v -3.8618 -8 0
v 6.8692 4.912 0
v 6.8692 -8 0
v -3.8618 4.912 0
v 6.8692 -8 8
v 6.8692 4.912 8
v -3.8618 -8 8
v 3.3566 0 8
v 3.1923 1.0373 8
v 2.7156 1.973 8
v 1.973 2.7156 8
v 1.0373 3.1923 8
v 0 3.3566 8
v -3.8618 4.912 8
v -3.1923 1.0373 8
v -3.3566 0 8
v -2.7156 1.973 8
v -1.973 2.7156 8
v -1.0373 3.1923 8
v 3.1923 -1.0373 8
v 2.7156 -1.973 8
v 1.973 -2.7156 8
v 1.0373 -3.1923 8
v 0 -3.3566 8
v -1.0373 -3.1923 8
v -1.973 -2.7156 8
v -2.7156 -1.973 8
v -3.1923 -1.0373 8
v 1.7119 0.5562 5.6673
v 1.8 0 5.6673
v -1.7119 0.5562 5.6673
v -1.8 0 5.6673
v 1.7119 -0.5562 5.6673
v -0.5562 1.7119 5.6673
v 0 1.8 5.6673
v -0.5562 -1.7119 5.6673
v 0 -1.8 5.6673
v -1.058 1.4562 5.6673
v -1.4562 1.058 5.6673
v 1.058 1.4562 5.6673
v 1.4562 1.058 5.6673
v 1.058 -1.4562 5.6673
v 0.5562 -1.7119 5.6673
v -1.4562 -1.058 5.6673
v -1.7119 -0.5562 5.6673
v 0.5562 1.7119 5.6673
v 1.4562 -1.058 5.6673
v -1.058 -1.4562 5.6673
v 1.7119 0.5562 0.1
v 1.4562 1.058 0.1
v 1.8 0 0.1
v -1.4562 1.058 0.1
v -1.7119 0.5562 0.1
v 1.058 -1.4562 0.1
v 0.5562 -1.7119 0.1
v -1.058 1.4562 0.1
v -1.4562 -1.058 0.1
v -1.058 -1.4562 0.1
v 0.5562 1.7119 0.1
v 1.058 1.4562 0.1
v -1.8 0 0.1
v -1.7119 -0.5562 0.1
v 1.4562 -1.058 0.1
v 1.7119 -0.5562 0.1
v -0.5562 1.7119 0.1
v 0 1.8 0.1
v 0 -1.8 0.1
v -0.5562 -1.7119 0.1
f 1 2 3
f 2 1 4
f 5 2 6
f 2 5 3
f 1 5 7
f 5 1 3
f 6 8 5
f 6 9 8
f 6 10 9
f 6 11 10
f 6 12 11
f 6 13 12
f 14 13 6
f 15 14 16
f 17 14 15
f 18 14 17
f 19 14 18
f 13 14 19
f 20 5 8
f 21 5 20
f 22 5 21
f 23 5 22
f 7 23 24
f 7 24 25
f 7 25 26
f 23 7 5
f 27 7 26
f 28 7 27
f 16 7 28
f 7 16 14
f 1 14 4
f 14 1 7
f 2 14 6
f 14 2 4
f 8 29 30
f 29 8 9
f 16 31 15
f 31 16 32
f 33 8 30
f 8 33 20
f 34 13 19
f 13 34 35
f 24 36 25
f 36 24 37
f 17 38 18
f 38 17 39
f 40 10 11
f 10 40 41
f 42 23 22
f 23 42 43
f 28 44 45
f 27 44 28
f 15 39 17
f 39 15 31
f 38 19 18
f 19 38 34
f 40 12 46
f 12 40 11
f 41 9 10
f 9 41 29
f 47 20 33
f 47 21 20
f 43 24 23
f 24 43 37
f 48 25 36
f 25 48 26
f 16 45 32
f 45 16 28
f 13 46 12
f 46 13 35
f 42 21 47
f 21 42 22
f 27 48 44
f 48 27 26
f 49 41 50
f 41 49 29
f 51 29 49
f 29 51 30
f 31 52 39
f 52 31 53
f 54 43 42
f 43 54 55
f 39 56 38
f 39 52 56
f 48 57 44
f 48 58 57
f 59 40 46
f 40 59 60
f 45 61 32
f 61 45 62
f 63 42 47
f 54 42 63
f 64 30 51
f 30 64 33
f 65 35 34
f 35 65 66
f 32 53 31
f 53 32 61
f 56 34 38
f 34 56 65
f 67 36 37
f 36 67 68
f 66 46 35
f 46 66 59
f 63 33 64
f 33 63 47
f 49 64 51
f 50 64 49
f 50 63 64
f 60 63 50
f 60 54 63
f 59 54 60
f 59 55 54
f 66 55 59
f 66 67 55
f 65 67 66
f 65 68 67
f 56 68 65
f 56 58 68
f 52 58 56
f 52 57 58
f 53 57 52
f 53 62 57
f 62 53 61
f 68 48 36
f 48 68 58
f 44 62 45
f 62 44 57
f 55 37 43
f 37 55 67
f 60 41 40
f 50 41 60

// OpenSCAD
// Street Numbers for 3D printing
// Charles Tilford, 2019
// License: CC BY-NC-SA 4.0
//   https://creativecommons.org/licenses/by-nc-sa/4.0/

char=".";     // The number/letter to print

// Units are in mm, except for height of letter

// How many inches high should letter be?
inchesHigh=3;
// How thick/deep should letter be (mm)?
depth=8;

// Character coordinates just center the letter
charX=-15;    // Character X coord
charY=-8;    // Character Y coord
topScrew=0;  // Top screw Y coord
botScrew=0; // Bottom screw Y coord
height=8;     // Thickness of character
// Screw dimensions. Default presumes
// #6 sheet metal screw
screwWid=3.6; // Width of screw shaft
screwTop=6.78;// Width of screw head
screwCon=5.08;// Height of head 'cone'

// Font to print in. Your system needs this
// installed, of course. If changed the hole
// positions almost certainly need to be
// changed, and maybe charX/charY.
fName="Open Sans Extrabold";
// https://fonts.google.com/specimen/Open+Sans
// Designer: Steve Matteson

// Thin floor below holes. My printer was
// struggling to have the hole 'border' stick
// to the stage. Just drill/screw thru it.
holeFloor=0.1; 

// ==========================================
// ===== All values below are auto-calculated
// ==========================================

// Scaled values
scaleFactor=inchesHigh / 3;
cX=charX * scaleFactor;
cY=charY * scaleFactor;
tS=topScrew * scaleFactor;
bS=botScrew * scaleFactor;
// Where do we start drawing screw head cone?
oS=depth - (screwCon-.05);

difference() {
  // We use difference() to punch out the screw holes
  // in the character
    
  // The character itself, 8mm thick
  translate([cX,cY,0])
    linear_extrude(height=depth, scale=1)
    text(char, size=(75*scaleFactor),
         $fn=100, font=fName);

  // Just one screw hole
  translate([0,tS,oS]) color("red")
    cylinder(h=screwCon, d2=screwTop,
             d1=0, $fn=20);
  translate([0,tS,holeFloor])
    cylinder(h=20, d=screwWid, $fn=20);
}

// Colors are just to aid visualization of
// void spaces. $fn is "featuer number", ie how
// many polygons are devoted to object. The values
// above should be near your printing limit anyway.

// Developed in OpenSCAD
//    https://www.openscad.org/
